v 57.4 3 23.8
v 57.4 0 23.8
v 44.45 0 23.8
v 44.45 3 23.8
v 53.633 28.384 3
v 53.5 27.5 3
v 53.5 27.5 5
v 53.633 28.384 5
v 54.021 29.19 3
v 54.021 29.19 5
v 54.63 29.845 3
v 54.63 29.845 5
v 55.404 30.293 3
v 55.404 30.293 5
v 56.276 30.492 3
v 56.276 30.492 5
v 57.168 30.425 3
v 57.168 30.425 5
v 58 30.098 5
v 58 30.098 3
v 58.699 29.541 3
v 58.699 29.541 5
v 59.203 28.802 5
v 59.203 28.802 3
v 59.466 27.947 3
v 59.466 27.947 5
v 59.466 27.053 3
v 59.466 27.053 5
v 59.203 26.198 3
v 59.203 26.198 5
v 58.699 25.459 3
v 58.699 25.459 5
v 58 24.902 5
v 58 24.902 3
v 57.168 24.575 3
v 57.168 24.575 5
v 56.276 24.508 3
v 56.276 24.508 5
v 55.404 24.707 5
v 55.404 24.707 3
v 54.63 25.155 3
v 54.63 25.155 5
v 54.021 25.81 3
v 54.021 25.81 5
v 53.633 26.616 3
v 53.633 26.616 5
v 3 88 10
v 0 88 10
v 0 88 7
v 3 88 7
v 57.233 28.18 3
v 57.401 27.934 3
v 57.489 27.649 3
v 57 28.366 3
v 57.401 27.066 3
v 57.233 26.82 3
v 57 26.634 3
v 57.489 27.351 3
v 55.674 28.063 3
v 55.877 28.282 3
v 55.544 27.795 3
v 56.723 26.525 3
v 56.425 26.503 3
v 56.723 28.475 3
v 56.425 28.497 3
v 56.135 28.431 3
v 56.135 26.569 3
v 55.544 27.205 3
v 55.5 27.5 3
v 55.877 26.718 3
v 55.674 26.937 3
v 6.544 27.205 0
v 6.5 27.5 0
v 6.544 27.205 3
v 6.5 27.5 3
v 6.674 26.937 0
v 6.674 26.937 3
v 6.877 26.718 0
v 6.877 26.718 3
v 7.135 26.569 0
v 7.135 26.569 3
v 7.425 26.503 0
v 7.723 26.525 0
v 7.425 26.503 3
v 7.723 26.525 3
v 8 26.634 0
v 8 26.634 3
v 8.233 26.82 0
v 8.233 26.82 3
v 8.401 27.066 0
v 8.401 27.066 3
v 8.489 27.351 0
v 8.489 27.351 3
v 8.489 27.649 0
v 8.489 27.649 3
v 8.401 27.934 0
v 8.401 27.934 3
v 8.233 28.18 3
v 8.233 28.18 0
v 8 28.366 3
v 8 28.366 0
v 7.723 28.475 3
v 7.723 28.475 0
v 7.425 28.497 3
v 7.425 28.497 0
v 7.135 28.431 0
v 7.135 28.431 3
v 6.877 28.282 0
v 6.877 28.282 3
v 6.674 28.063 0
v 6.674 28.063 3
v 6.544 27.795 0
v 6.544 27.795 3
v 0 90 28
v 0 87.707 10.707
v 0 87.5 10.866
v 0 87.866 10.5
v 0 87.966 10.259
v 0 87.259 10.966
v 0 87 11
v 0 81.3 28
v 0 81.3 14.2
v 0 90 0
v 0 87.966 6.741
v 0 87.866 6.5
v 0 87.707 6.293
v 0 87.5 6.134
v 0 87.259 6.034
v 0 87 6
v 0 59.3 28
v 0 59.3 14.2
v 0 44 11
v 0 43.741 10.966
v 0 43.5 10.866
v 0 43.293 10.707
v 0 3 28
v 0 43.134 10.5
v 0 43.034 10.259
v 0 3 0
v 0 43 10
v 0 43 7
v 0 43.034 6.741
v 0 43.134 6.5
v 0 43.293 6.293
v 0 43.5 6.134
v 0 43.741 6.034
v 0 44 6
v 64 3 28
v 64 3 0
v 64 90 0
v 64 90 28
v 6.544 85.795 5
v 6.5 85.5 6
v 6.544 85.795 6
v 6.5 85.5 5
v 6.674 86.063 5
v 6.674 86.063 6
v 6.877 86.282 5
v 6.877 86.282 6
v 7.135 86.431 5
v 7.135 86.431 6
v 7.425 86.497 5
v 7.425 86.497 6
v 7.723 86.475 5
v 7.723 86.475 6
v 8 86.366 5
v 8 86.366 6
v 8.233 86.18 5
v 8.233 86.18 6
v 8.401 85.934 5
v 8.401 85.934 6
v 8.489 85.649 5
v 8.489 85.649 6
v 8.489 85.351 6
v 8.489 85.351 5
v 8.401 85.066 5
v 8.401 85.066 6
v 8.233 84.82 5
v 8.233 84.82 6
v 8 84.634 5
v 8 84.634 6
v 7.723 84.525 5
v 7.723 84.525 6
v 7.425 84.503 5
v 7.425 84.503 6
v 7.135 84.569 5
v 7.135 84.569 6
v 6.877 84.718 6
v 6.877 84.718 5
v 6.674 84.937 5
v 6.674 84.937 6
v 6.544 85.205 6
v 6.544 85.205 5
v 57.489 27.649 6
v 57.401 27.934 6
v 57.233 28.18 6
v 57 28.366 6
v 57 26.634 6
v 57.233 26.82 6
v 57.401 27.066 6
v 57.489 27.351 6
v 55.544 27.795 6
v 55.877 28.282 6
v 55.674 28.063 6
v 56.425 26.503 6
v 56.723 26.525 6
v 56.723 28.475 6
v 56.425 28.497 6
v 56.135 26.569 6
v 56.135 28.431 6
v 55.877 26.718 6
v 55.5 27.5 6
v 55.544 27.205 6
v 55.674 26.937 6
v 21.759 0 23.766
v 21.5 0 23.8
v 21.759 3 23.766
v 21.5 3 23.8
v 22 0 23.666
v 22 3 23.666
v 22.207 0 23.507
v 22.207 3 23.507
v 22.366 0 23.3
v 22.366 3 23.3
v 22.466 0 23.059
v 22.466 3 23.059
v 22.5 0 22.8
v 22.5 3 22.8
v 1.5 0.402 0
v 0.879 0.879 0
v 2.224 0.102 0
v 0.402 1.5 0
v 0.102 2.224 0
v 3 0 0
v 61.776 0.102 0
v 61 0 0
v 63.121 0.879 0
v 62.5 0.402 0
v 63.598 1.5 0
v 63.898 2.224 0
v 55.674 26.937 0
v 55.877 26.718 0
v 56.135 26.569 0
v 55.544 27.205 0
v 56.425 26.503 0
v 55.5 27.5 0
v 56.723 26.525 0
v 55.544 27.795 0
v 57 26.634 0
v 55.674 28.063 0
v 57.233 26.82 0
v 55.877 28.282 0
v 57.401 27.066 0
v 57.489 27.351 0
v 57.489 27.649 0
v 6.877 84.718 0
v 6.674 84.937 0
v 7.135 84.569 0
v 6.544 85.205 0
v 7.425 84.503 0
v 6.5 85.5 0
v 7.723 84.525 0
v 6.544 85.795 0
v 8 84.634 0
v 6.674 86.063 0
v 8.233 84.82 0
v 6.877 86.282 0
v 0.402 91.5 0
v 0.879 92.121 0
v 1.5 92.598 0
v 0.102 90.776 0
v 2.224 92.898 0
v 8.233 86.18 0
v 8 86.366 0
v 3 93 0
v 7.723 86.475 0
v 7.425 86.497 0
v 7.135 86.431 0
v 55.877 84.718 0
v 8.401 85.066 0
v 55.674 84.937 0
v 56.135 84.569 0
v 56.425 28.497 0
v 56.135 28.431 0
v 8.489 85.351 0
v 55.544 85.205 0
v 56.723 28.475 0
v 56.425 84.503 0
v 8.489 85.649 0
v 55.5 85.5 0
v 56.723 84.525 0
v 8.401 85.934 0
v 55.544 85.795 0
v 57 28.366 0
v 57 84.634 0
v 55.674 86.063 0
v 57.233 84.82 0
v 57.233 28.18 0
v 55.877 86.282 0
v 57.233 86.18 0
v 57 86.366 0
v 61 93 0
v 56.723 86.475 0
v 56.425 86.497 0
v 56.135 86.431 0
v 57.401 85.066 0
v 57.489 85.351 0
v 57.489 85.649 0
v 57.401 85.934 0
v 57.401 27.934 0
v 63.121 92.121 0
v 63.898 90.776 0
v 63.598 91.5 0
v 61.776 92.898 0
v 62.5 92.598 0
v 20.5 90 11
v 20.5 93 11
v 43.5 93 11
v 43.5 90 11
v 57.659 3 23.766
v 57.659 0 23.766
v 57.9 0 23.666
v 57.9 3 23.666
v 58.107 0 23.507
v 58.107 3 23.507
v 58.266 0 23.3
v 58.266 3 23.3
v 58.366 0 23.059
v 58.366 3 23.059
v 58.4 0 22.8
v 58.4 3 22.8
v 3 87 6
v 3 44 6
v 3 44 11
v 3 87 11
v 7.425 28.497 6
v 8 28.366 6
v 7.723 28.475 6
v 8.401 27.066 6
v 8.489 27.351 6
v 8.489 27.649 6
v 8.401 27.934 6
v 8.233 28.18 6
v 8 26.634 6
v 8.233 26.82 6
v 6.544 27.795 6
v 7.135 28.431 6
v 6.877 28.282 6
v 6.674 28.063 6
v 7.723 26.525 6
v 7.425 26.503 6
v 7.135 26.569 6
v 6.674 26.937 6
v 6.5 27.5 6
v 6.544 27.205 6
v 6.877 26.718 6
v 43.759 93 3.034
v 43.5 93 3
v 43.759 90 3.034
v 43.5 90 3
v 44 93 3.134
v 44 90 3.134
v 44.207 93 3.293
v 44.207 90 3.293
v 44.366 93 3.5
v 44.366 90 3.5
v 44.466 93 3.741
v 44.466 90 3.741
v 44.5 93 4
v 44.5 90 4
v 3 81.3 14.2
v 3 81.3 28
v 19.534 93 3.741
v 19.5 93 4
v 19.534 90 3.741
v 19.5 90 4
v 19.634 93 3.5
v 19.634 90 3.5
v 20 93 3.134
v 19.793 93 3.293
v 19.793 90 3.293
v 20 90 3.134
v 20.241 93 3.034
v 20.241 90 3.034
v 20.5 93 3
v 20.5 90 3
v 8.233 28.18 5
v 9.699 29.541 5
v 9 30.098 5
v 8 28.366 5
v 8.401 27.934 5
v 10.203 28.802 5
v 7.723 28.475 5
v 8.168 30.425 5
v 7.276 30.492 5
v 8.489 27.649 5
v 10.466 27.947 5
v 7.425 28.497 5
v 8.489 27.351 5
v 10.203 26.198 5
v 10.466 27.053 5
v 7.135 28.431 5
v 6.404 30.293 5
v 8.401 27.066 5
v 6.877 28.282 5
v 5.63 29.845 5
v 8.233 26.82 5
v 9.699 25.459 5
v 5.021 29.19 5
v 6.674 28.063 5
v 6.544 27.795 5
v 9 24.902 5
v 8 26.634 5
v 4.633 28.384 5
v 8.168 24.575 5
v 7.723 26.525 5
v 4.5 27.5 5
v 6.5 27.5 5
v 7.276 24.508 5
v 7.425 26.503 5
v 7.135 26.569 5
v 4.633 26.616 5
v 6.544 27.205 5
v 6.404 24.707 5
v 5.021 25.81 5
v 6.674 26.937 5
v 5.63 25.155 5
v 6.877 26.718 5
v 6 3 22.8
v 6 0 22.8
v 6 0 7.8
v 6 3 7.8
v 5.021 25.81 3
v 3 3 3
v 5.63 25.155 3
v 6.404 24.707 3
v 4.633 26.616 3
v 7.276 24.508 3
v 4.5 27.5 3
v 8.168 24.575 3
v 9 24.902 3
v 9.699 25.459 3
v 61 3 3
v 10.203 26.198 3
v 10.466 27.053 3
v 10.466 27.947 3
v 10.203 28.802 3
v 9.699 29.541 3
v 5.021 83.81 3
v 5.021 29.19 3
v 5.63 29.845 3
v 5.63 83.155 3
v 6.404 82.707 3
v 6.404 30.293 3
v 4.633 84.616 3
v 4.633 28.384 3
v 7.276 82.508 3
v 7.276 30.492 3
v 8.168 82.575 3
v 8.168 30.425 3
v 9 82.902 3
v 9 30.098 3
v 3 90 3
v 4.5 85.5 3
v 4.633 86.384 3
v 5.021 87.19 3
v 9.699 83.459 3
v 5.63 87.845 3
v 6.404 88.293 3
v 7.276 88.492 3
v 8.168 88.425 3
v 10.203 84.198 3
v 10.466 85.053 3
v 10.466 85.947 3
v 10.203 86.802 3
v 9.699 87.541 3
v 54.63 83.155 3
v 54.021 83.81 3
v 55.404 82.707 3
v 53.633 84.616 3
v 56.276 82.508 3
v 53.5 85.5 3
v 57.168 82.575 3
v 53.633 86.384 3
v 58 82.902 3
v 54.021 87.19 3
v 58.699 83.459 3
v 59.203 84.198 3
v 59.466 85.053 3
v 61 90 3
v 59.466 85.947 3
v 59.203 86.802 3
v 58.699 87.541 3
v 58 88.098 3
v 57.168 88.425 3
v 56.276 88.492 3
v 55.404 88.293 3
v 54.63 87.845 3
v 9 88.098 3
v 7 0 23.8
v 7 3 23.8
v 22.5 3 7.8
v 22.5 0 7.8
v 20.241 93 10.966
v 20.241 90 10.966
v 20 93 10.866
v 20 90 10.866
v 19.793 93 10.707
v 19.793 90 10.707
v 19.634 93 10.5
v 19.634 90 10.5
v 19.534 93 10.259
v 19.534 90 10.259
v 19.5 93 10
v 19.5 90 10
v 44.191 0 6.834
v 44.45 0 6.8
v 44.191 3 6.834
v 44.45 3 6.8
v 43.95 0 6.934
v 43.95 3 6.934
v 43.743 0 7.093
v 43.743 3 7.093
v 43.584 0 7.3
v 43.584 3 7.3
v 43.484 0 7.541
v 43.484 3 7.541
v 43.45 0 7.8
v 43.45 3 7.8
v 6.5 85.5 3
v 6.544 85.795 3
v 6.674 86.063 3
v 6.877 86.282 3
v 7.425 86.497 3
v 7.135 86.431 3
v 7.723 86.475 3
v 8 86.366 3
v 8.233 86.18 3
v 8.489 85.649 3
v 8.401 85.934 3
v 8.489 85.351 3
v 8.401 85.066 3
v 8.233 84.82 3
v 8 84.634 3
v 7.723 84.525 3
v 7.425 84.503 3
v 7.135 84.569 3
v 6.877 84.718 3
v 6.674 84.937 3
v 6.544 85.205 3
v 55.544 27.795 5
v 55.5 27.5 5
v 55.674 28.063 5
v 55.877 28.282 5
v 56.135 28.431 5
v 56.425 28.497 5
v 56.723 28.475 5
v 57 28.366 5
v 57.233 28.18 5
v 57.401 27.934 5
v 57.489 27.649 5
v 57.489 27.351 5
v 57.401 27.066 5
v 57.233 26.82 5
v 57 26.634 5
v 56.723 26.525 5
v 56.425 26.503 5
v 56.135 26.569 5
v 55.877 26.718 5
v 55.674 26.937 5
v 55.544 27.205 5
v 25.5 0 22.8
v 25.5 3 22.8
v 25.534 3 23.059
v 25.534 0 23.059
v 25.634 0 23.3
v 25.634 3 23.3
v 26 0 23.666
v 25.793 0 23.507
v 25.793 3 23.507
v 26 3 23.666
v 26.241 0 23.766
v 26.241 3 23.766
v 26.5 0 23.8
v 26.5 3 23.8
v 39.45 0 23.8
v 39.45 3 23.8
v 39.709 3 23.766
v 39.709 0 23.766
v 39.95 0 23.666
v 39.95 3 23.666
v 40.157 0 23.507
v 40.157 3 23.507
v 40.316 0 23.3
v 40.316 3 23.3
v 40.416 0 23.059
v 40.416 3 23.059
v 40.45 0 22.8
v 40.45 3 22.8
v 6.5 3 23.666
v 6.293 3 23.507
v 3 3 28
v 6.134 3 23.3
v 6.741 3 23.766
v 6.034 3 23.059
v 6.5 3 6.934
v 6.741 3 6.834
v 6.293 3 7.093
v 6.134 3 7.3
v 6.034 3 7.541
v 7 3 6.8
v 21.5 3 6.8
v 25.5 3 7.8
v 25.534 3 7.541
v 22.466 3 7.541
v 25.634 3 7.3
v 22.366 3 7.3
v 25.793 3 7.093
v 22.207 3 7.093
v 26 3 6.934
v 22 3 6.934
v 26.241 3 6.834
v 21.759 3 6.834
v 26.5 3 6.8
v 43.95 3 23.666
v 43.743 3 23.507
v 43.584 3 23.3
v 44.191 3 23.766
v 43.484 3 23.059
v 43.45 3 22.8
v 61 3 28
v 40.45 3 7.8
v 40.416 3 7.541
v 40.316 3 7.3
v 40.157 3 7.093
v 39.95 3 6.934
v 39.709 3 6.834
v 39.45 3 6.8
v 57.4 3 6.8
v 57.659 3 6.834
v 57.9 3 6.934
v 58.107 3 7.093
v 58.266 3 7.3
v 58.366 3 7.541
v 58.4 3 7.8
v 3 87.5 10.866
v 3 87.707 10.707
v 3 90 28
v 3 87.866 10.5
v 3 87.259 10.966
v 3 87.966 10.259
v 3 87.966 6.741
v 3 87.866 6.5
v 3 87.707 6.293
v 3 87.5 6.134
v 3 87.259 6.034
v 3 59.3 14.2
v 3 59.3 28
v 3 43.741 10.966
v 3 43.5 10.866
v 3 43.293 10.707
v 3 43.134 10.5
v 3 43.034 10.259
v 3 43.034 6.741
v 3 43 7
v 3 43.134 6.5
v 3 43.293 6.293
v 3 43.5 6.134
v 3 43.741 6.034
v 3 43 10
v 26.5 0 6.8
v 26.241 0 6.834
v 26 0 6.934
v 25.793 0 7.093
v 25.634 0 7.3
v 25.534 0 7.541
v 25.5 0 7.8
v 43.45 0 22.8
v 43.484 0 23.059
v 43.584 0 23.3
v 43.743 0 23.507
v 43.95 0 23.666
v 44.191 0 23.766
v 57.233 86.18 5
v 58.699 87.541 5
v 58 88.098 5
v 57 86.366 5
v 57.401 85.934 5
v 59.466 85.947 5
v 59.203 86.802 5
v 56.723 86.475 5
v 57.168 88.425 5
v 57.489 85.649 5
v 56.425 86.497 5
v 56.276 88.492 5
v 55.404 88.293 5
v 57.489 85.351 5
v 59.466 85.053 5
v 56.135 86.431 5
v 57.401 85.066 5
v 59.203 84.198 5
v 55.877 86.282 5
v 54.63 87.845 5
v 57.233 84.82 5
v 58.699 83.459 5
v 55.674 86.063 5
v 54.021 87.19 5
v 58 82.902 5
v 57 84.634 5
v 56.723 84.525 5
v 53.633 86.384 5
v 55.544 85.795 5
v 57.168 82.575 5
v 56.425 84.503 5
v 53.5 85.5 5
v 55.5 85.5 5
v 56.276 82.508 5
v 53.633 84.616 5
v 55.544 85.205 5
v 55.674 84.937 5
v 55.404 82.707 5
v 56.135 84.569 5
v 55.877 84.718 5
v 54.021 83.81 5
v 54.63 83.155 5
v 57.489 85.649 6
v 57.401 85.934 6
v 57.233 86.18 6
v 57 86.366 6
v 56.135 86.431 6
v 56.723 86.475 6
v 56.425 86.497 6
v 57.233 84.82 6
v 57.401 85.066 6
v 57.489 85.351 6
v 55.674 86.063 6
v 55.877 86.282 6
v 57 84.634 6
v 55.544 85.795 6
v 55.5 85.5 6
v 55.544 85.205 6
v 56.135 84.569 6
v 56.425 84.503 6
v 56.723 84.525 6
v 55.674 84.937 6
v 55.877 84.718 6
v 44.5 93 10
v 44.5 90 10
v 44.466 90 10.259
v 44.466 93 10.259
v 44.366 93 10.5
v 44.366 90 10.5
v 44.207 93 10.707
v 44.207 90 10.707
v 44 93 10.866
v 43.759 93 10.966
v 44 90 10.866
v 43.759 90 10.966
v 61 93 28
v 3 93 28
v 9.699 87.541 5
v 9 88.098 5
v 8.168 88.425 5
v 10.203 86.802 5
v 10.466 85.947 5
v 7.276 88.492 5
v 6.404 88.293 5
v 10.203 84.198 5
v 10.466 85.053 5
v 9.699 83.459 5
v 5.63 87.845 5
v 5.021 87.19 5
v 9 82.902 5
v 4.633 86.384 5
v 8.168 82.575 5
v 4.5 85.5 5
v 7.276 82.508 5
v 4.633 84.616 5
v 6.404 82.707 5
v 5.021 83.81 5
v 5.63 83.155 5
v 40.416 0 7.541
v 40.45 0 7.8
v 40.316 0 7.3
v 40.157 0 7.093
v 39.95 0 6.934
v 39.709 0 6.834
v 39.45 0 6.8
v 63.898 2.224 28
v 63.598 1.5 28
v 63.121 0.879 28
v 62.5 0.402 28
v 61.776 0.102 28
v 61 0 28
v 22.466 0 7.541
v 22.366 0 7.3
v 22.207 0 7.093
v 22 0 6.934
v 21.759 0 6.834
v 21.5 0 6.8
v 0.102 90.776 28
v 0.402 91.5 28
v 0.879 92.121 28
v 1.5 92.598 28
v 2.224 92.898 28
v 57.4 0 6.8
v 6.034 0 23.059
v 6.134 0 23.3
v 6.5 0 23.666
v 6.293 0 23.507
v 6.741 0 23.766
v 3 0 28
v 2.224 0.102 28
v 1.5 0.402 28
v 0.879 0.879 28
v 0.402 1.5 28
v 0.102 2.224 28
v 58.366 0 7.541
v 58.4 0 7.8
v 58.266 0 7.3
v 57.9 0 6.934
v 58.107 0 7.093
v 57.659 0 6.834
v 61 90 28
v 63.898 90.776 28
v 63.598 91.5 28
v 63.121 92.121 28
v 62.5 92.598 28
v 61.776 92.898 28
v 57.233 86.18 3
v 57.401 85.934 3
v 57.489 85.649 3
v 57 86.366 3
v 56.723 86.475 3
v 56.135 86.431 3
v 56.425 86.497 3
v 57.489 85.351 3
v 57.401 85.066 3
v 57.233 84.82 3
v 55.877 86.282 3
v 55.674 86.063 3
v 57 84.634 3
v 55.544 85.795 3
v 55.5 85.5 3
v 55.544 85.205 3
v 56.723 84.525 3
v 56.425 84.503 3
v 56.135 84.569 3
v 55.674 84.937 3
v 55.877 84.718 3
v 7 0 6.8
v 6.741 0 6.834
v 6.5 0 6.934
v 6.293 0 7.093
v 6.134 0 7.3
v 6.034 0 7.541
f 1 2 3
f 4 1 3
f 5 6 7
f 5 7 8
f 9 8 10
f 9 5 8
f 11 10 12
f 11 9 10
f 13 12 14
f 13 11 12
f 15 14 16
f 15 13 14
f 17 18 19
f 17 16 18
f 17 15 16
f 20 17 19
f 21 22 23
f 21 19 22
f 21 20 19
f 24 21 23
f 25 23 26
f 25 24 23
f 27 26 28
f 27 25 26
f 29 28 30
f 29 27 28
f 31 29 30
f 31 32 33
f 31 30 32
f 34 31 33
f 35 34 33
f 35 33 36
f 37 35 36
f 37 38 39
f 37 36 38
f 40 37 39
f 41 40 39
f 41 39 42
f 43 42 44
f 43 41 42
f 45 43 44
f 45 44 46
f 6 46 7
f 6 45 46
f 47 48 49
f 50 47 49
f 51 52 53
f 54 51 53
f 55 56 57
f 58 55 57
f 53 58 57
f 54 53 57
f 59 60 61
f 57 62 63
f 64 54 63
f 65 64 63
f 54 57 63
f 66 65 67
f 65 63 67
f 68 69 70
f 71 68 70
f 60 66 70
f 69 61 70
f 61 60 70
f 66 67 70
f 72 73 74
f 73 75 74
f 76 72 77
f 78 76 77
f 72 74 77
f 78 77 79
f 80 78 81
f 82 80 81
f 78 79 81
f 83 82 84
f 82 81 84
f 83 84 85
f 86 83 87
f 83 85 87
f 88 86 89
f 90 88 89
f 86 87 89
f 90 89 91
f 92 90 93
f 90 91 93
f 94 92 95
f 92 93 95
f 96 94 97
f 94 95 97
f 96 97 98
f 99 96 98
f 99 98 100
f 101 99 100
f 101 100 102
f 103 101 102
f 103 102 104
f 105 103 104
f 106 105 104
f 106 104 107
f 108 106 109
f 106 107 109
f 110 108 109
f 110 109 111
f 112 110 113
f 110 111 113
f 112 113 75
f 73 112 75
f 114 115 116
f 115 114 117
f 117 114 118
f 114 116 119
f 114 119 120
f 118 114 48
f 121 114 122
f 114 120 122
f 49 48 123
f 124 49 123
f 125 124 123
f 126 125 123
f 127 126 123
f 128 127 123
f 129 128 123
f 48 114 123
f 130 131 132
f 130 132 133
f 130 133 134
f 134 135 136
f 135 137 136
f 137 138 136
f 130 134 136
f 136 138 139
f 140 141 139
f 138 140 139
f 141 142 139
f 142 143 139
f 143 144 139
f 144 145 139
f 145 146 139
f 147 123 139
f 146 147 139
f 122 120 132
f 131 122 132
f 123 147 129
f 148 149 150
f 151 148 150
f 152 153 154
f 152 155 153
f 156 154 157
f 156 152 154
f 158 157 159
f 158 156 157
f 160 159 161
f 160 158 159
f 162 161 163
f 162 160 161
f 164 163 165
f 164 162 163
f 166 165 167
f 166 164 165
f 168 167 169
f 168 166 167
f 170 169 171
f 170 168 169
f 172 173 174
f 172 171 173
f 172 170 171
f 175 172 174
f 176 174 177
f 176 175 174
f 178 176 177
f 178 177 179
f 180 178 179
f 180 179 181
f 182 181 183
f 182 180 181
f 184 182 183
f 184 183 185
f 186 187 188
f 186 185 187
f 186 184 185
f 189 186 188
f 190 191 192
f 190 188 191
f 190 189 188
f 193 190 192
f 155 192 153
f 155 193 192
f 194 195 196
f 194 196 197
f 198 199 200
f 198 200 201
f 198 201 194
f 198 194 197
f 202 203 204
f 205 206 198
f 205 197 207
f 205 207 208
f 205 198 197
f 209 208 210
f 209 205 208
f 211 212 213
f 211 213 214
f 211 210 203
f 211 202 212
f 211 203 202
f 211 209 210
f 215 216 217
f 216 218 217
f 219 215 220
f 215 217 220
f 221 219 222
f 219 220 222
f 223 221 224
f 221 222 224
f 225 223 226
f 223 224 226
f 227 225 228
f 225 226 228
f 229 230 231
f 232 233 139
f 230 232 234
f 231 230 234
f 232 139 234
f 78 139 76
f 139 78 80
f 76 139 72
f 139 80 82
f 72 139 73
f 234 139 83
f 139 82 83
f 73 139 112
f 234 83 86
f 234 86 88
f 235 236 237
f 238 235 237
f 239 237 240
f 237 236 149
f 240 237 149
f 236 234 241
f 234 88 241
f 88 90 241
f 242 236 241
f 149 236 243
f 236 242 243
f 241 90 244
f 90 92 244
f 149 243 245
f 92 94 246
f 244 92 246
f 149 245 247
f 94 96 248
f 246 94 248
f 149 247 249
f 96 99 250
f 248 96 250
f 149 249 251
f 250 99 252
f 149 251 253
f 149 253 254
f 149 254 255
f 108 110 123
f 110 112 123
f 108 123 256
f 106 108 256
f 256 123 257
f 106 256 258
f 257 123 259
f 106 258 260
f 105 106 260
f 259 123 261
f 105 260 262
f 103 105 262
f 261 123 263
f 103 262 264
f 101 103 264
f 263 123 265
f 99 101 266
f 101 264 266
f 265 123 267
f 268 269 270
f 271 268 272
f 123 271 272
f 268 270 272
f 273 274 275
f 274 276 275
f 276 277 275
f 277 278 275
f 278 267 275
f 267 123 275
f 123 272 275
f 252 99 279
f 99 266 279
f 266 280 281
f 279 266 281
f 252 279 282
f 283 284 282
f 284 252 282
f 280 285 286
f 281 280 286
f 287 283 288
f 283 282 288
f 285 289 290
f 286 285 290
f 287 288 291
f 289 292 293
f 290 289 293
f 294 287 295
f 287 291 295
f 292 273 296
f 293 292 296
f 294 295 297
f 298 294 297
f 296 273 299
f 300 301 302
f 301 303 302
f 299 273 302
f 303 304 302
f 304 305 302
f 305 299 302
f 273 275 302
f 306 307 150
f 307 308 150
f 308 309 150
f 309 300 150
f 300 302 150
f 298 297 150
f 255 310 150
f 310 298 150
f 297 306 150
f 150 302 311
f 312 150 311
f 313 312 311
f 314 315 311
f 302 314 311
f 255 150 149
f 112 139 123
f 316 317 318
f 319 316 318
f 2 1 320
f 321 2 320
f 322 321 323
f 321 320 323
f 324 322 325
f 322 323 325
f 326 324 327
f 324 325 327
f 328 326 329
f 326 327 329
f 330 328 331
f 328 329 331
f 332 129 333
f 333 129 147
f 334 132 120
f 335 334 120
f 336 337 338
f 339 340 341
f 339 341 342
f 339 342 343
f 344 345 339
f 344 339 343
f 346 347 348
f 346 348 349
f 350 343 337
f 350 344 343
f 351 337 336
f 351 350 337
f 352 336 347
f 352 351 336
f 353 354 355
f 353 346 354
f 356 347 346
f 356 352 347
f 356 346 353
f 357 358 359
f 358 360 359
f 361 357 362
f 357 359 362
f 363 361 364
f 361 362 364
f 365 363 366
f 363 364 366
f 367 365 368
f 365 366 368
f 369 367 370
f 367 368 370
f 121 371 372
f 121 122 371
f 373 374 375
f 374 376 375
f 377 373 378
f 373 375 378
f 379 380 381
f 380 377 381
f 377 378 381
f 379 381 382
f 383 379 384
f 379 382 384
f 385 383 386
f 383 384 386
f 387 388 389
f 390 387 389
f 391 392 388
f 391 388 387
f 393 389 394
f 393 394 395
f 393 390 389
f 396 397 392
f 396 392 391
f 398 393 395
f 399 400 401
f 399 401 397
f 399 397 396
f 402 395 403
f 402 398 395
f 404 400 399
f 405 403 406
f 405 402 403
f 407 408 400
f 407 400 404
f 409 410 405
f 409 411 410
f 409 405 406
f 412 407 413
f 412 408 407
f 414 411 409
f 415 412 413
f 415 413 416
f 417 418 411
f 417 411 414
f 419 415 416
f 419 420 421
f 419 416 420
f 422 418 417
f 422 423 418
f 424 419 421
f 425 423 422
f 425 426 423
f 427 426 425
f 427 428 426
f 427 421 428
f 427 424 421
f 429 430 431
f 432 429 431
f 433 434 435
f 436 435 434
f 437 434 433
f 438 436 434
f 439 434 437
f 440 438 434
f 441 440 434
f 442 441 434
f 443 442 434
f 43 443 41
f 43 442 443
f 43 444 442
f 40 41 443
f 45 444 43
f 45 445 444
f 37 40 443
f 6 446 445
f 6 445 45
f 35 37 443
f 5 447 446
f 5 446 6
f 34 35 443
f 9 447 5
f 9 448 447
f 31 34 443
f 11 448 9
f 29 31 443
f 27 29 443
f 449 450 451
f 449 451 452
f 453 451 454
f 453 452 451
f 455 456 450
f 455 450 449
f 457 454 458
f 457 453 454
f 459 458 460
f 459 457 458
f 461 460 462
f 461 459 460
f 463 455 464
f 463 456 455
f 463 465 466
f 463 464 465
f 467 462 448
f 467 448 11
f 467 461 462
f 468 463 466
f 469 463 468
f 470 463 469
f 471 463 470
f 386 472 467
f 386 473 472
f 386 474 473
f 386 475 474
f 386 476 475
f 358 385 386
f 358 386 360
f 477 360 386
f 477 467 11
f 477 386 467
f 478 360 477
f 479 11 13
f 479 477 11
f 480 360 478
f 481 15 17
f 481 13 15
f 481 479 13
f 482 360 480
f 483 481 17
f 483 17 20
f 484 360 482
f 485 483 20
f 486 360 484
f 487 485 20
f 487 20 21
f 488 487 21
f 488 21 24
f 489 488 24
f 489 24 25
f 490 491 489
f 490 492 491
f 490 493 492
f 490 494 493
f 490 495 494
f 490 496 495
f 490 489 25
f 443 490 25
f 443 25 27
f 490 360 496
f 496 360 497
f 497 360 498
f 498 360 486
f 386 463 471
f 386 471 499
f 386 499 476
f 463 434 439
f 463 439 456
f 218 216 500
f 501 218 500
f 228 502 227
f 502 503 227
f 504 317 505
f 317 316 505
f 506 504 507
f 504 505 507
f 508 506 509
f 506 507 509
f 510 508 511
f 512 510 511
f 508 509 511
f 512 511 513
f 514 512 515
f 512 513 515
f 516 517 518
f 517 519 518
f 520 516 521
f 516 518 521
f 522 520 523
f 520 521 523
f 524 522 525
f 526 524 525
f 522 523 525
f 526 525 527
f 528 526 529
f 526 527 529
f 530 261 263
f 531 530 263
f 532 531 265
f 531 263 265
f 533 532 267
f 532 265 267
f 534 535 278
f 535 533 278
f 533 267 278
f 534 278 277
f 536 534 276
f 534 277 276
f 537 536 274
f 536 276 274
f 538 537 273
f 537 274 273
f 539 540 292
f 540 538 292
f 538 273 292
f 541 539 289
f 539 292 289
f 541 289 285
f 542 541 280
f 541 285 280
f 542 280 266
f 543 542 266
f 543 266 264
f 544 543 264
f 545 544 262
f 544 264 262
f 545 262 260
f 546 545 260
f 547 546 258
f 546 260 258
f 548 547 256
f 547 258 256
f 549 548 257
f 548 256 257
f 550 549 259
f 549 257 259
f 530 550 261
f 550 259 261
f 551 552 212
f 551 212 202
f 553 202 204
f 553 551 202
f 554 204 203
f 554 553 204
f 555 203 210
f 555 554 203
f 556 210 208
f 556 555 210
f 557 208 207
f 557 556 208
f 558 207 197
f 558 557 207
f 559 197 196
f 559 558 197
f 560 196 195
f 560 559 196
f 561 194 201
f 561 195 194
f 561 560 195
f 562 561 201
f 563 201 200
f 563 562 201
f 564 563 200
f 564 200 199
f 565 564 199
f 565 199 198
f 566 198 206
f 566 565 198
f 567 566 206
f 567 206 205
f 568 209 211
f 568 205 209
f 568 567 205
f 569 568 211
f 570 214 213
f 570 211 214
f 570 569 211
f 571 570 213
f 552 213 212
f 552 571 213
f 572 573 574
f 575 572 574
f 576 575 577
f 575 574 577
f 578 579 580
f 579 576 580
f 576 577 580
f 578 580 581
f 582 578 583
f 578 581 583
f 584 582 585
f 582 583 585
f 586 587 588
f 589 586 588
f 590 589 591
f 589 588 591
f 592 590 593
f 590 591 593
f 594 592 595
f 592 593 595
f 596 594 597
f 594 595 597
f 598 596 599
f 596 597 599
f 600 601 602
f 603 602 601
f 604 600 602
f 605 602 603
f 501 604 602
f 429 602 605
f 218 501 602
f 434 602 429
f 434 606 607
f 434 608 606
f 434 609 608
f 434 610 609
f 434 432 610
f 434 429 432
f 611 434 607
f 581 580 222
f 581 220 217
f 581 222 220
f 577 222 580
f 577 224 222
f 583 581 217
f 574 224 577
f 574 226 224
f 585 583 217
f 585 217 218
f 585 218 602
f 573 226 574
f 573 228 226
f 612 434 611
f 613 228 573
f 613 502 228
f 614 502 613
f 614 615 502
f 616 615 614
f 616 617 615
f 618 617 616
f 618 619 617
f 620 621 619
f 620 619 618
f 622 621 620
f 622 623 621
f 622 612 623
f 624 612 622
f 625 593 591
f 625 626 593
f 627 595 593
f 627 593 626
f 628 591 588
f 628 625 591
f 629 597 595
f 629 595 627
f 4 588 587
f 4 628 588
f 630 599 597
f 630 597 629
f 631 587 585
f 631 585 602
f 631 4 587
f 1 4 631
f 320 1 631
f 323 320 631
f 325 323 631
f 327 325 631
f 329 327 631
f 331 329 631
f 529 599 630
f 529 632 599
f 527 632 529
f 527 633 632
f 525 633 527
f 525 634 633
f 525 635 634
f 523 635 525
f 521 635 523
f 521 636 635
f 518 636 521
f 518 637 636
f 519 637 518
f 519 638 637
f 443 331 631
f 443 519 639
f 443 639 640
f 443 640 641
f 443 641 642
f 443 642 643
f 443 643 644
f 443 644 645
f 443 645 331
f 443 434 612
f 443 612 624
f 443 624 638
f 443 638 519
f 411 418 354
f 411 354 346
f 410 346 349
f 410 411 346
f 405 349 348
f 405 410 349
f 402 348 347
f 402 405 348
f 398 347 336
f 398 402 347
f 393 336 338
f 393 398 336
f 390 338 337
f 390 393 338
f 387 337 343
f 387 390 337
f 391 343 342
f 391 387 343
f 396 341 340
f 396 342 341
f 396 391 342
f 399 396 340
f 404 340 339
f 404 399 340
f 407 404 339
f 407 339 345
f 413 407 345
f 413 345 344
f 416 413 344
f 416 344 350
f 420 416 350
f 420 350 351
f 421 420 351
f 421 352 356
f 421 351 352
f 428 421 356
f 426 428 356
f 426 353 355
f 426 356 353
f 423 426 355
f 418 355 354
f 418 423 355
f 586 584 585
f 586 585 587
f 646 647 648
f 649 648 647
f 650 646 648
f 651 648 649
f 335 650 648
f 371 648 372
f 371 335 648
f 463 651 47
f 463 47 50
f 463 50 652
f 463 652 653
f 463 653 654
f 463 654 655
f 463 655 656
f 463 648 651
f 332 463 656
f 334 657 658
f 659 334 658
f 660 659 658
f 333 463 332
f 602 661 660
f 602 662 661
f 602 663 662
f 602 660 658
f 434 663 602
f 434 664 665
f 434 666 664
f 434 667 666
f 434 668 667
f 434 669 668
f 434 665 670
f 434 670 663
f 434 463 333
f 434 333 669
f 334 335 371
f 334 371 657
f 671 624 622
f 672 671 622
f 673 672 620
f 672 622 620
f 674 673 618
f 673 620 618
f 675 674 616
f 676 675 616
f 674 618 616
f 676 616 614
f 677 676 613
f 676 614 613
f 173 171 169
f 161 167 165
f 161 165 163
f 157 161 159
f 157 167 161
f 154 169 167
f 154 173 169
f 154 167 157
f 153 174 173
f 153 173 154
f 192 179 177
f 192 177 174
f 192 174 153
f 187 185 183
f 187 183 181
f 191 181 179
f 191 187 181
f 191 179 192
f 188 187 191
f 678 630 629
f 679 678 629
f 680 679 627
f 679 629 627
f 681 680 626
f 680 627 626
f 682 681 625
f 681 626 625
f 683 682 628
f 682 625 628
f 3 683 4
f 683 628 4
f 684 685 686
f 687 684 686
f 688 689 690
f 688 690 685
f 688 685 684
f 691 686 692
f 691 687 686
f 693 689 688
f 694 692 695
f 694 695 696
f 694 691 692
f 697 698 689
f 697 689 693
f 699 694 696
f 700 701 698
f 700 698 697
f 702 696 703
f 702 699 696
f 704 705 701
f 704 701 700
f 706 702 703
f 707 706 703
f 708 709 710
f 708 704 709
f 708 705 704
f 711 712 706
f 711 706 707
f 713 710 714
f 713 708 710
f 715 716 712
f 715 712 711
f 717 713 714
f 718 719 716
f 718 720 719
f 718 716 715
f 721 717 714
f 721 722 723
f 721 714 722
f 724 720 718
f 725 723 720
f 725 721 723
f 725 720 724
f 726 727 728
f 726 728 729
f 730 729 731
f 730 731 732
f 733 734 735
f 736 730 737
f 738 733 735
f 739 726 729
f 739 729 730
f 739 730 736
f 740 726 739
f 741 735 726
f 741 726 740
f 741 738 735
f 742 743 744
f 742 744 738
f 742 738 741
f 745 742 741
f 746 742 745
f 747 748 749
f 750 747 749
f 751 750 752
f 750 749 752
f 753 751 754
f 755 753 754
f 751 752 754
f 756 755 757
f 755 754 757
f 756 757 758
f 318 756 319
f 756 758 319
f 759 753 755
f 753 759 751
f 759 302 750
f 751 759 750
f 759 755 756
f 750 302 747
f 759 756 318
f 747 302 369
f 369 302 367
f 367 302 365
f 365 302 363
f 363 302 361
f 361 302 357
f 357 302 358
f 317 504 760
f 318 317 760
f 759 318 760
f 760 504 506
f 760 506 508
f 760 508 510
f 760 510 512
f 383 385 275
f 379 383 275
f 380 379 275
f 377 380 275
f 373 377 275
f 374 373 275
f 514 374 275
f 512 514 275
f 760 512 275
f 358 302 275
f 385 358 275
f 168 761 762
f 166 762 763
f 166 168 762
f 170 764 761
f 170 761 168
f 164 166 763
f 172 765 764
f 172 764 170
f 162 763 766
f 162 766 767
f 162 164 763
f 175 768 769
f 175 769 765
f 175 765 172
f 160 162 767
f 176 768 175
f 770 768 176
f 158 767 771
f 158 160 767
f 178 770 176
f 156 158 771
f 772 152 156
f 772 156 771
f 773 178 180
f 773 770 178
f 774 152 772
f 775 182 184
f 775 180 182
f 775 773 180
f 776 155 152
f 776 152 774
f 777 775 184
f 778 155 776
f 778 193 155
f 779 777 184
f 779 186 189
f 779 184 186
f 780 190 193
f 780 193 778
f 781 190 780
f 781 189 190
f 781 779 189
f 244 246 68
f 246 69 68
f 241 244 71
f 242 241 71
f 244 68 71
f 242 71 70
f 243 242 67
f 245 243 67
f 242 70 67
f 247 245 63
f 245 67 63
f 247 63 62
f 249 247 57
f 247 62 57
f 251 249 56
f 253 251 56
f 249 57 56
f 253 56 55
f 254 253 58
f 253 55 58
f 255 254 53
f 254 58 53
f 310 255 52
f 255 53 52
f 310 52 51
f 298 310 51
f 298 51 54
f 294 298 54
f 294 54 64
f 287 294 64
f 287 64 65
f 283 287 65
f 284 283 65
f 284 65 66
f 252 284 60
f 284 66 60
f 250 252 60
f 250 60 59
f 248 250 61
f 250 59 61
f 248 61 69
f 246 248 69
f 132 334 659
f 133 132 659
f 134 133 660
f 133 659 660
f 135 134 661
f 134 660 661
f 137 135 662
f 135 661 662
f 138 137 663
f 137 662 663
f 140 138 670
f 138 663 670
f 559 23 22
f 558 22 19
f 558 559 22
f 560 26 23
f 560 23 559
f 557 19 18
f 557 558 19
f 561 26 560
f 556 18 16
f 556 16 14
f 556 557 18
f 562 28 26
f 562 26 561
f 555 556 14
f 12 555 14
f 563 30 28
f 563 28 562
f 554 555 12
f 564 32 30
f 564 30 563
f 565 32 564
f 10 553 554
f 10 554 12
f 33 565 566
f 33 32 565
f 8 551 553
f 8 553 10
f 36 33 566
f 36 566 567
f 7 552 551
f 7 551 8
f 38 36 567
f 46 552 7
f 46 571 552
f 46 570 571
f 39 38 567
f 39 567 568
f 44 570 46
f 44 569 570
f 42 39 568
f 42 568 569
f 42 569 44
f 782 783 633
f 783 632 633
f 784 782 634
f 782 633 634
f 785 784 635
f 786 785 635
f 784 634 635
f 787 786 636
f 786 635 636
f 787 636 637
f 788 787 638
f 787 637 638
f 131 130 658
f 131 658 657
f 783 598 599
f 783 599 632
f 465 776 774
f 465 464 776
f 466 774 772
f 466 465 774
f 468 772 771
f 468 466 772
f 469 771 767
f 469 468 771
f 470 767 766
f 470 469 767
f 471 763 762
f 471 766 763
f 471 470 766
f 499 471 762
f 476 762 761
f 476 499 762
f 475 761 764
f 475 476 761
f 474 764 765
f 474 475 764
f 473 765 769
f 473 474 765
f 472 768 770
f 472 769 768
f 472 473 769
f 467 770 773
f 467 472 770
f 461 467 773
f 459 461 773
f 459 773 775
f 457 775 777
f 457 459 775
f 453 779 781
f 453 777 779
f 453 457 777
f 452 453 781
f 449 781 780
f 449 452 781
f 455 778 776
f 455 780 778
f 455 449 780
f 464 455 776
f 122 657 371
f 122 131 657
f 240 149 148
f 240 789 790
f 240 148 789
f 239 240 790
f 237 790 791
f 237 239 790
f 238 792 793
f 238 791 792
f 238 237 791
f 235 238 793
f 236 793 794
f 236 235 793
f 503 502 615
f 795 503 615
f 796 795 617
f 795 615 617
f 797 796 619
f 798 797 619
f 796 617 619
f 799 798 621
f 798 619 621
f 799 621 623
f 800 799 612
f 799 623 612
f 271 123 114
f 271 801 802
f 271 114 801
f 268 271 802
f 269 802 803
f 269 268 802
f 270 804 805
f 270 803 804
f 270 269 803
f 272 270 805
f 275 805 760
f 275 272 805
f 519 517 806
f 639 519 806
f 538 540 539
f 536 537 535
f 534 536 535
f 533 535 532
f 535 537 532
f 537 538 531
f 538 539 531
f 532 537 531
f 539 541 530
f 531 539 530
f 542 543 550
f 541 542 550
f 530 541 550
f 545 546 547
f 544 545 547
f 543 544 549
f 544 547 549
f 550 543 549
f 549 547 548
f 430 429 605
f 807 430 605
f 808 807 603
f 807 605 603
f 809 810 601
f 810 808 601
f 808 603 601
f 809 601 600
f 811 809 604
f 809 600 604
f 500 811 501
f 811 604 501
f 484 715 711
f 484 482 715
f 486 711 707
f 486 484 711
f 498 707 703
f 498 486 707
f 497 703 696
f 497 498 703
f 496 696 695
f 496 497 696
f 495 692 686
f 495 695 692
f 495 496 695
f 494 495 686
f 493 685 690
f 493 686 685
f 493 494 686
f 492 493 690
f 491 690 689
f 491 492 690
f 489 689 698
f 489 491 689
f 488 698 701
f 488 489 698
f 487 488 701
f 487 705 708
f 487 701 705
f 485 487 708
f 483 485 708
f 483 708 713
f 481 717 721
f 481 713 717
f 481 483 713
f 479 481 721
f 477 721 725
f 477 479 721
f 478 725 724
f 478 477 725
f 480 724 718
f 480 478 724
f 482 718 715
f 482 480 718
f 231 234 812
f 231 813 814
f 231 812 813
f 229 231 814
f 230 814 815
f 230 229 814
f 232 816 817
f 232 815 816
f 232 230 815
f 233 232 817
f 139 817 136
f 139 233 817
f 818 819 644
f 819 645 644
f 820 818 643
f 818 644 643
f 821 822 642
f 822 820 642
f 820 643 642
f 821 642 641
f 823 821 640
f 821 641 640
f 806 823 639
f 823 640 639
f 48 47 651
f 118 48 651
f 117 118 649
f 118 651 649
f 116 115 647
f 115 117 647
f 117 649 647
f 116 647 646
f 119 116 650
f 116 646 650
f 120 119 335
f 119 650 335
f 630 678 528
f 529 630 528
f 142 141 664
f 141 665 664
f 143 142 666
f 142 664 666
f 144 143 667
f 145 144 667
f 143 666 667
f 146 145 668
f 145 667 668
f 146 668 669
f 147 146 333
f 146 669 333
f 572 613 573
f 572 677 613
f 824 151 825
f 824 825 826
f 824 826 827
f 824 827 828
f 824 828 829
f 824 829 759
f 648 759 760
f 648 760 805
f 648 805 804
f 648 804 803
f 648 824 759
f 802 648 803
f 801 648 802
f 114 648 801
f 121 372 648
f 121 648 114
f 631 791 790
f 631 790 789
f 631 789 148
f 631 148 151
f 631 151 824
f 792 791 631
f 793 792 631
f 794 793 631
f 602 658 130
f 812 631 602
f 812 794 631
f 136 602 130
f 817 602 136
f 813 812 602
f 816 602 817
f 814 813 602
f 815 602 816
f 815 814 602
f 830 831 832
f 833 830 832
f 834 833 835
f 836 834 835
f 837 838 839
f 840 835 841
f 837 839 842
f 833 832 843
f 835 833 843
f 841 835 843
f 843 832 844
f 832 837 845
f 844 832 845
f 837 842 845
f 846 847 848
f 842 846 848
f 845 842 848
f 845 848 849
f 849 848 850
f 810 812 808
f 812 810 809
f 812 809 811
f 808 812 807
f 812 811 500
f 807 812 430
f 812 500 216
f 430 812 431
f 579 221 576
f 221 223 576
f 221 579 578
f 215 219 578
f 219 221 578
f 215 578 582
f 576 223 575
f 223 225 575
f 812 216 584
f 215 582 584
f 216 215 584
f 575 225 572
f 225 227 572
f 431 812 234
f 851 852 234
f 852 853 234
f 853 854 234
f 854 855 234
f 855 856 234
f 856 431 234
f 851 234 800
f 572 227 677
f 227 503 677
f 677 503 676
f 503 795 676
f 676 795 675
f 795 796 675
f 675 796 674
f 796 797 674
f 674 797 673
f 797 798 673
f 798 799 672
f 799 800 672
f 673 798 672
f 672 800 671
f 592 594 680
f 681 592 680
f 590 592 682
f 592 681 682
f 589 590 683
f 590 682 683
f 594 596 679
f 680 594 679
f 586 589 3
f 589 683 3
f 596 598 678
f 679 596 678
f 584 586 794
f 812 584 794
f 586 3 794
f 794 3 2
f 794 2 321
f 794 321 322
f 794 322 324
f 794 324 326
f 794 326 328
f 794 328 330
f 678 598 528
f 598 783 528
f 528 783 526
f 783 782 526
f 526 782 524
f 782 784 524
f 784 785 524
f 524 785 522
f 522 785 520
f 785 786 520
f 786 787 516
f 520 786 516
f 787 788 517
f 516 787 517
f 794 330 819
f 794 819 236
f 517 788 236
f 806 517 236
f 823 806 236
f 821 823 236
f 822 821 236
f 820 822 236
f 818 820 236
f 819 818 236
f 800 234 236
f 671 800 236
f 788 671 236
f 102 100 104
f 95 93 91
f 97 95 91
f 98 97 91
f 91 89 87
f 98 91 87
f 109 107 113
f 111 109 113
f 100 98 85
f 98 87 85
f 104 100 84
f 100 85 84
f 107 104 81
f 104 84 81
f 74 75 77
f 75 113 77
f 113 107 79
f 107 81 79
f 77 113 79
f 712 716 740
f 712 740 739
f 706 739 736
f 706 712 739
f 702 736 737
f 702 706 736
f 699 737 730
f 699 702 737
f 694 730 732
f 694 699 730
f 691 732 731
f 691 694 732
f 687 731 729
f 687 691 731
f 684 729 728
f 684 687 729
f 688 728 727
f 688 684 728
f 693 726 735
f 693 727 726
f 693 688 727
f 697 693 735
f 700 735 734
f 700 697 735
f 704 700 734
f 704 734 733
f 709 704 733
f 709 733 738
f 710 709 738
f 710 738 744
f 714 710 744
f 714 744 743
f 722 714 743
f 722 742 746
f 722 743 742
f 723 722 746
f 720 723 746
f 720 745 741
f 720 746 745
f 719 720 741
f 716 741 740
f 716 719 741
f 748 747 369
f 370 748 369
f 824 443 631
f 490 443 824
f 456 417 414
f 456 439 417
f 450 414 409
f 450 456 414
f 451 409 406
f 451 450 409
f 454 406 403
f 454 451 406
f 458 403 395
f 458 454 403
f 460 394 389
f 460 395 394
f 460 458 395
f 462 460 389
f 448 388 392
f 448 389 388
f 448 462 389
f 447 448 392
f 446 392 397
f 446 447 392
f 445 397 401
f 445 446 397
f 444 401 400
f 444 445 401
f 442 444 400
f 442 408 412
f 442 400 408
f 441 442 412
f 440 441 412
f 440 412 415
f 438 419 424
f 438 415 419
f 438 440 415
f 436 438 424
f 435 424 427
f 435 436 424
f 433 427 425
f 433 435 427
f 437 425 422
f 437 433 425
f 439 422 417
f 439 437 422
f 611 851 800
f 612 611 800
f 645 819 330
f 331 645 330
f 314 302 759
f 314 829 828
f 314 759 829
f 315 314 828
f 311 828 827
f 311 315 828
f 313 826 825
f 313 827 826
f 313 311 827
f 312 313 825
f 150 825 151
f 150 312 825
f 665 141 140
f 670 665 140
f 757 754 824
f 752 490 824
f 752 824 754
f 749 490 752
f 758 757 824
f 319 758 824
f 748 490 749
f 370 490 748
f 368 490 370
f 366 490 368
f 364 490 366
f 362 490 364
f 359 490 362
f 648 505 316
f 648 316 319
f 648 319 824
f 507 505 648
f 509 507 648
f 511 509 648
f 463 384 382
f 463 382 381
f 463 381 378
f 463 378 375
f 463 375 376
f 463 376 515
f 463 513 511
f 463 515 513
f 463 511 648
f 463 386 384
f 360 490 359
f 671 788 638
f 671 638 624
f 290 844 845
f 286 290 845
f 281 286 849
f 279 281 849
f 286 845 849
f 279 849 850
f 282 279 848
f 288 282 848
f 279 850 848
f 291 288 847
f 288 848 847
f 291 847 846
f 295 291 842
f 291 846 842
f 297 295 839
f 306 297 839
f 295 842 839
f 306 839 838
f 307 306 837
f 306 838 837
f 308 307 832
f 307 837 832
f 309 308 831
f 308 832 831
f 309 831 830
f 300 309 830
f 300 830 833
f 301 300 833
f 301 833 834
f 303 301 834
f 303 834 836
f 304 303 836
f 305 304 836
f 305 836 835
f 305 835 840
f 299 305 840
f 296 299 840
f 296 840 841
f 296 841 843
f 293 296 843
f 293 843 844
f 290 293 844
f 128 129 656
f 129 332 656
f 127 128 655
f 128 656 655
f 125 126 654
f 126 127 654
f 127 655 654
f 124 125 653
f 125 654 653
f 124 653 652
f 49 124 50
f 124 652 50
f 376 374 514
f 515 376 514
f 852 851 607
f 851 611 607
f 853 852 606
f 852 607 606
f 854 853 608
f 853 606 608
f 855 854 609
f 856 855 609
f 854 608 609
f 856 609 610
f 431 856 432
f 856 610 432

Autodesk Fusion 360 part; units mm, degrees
sketch "Sketch1" plane through (0, 0, 0) normal (0, 0, 1) x (1, 0, 0)
  line L0 (3, 0) -> (61, 0)
  line L1 (64, 3) -> (64, 90)
  line L2 (61, 93) -> (3, 93)
  line L3 (0, 90) -> (0, 3)
  arc A0 (3, 93) -> (0, 90) centre (3, 90) ccw
  arc A1 (64, 90) -> (61, 93) centre (61, 90) ccw
  arc A2 (61, 0) -> (64, 3) centre (61, 3) ccw
  arc A3 (0, 3) -> (3, 0) centre (3, 3) ccw
  point P0 (64, 0)
  point P1 (0, 93)
  dimension "d1" = 64
  dimension "d2" = 93
  dimension "d3" = 3
  dimension "d4" = 3
extrude "Extrude1" add sketch "Sketch1" along normal blind 3
sketch "Sketch4" plane through (0, 0, 3) normal (0, 0, 1) x (-1, 0, 0)
  arc A0 (0, -3) -> (-3, 0) centre (-3, -3) ccw
  line L0 (-3, 0) -> (-61, 0)
  arc A1 (-61, 0) -> (-64, -3) centre (-61, -3) ccw
  line L1 (-64, -3) -> (-64, -90)
  arc A2 (-64, -90) -> (-61, -93) centre (-61, -90) ccw
  line L2 (-61, -93) -> (-3, -93)
  arc A3 (-3, -93) -> (0, -90) centre (-3, -90) ccw
  line L3 (0, -90) -> (0, -3)
  line L4 (-3, -3) -> (-61, -3)
  line L5 (-61, -3) -> (-61, -90)
  line L6 (-61, -90) -> (-3, -90)
  line L7 (-3, -90) -> (-3, -3)
  dimension "d11" = 58
  dimension "d12" = 87
  dimension "d13" = 3
  dimension "d14" = 3
extrude "Extrude2" add sketch "Sketch4" along normal blind 25
sketch "Sketch5" plane through (0, 0, 0) normal (0, -1, 0) x (1, 0, 0)
  line L0 (3, 0) -> (61, 0)
  line L1 (61, 0) -> (61, 23)
  line L2 (3, 23) -> (61, 23)
  line L3 (6, 6.8) -> (22.5, 6.8)
  line L4 (22.5, 6.8) -> (22.5, 23.8)
  line L5 (22.5, 23.8) -> (6, 23.8)
  line L6 (6, 23.8) -> (6, 6.8)
  line L7 (3, 0) -> (3, 23)
  line L8 (25.5, 23.8) -> (40.45, 23.8)
  line L9 (40.45, 23.8) -> (40.45, 6.8)
  line L10 (40.45, 6.8) -> (25.5, 6.8)
  line L11 (25.5, 6.8) -> (25.5, 23.8)
  line L12 (43.45, 6.8) -> (58.4, 6.8)
  line L13 (58.4, 6.8) -> (58.4, 23.8)
  line L14 (58.4, 23.8) -> (43.45, 23.8)
  line L15 (43.45, 23.8) -> (43.45, 6.8)
  line L16 (3, 0) -> (61, 0)
  line L17 (61, 0) -> (61, 28)
  line L18 (61, 28) -> (3, 28)
  line L19 (3, 28) -> (3, 0)
  dimension "d21" = 16.5
  dimension "d22" = 17
  dimension "d23" = 3
  dimension "d26" = 14.95
  dimension "d27" = 17
  dimension "d29" = 14.95
  dimension "d30" = 17
  dimension "d31" = 3
  dimension "d34" = 3
  dimension "d45" = 6.8
extrude "Extrude4" cut sketch "Sketch5" against normal blind 3 contours L2 L4 L5 L6 | L2 L3 L4 L6 | L2 L12 L13 L15 | L2 L13 L14 L15 | L2 L8 L9 L11 | L2 L9 L10 L11
sketch "Sketch6" plane through (0, 0, 3) normal (0, 0, 1) x (-1, 0, 0)
  line L0 (-3, -3) -> (-61, -3)
  line L1 (-61, -3) -> (-61, -90)
  line L2 (-61, -90) -> (-3, -90)
  line L3 (-3, -90) -> (-3, -3)
  circle A0 centre (-7.5, -85.5) radius 1
  circle A1 centre (-7.5, -85.5) radius 3
  circle A2 centre (-56.5, -85.5) radius 1
  circle A3 centre (-56.5, -85.5) radius 3
  circle A4 centre (-56.5, -27.5) radius 1
  circle A5 centre (-56.5, -27.5) radius 3
  circle A6 centre (-7.5, -27.5) radius 1
  circle A7 centre (-7.5, -27.5) radius 3
  dimension "d35" = 2
  dimension "d36" = 4.5
  dimension "d37" = 4.5
  dimension "d38" = 6
  dimension "d59" = 2
  dimension "d60" = 4.5
  dimension "d61" = 4.5
  dimension "d62" = 6
  dimension "d63" = 2
  dimension "d64" = 4.5
  dimension "d65" = 58
  dimension "d66" = 6
  dimension "d67" = 2
  dimension "d68" = 4.5
  dimension "d69" = 58
  dimension "d70" = 6
extrude "Extrude6" cut sketch "Sketch6" against normal blind 3 contours A0 | A2 | A4 | A6
extrude "Extrude7" add sketch "Sketch6" along normal blind 0.5 contours A1
sketch "Sketch7" plane through (0, 0, 0) normal (-1, 0, 0) x (0, -1, 0)
  line L0 (-90, 0) -> (-3, 0)
  line L1 (-3, 0) -> (-3, 28)
  line L2 (-3, 28) -> (-90, 28)
  line L3 (-90, 28) -> (-90, 0)
  line L4 (-88, 6) -> (-43, 6)
  line L5 (-43, 6) -> (-43, 11)
  line L6 (-43, 11) -> (-88, 11)
  line L7 (-88, 11) -> (-88, 6)
  dimension "d46" = 45
  dimension "d47" = 5
  dimension "d50" = 6
extrude "Extrude8" cut sketch "Sketch7" against normal blind 3 contours L4 L5 L6 L7
sketch "Sketch8" plane through (0, 93, 0) normal (0, 1, 0) x (-1, 0, 0)
  line L0 (-61, 0) -> (-3, 0)
  line L1 (-3, 0) -> (-3, 28)
  line L2 (-3, 28) -> (-61, 28)
  line L3 (-61, 28) -> (-61, 0)
  line L4 (-44.5, 3) -> (-19.5, 3)
  line L5 (-19.5, 3) -> (-19.5, 11)
  line L6 (-19.5, 11) -> (-44.5, 11)
  line L7 (-44.5, 11) -> (-44.5, 3)
  line L8 (-3, 0) -> (-3, 23)
  line L9 (-3, 0) -> (-61, 0)
  dimension "d51" = 25
  dimension "d52" = 8
  dimension "d53" = 16.5
  dimension "d54" = 3
extrude "Extrude9" cut sketch "Sketch8" against normal blind 3 contours L4 L5 L6 L7
extrude "Extrude10" add 1 faces at (9.6751, 86.3269, 3.5) along direction (0, 0, 1) blind 1.5
extrude "Extrude11" add sketch "Sketch6" along normal blind 2 contours A3 | A5 | A7
extrude "Extrude13" add sketch "Sketch6" along normal blind 3 contours A4
extrude "Extrude14" add sketch "Sketch6" along normal blind 3 contours A0 | A2 | A6
sketch "Sketch11" plane through (0, 0, 0) normal (-1, 0, 0) x (0, -1, 0)
  line L0 (-43, 6) -> (-88, 6)
  line L1 (-88, 6) -> (-88, 11)
  line L2 (-88, 11) -> (-43, 11)
  line L3 (-43, 11) -> (-43, 6)
  line L4 (-90, 0) -> (-3, 0)
  line L5 (-3, 0) -> (-3, 28)
  line L6 (-3, 28) -> (-90, 28)
  line L7 (-90, 28) -> (-90, 0)
  line L8 (-81.3, 28) -> (-59.3, 28)
  line L9 (-59.3, 28) -> (-59.3, 14.2)
  line L10 (-59.3, 14.2) -> (-81.3, 14.2)
  line L11 (-81.3, 14.2) -> (-81.3, 28)
  dimension "d85" = 22
  dimension "d86" = 13.8
  dimension "d87" = 8.7
extrude "Extrude15" cut sketch "Sketch11" against normal blind 3 contours L6 L8 L9 L10 L11
fillet "Fillet1" radius 1 1 edges at (1.5, 81.3, 14.2)
fillet "Fillet2" radius 1 21 edges at (1.5, 59.3, 14.2) (44.5, 91.5, 3) (44.5, 91.5, 11) (19.5, 91.5, 3) (19.5, 91.5, 11) (1.5, 43, 6) (6, 1.5, 6.8) (25.5, 1.5, 6.8) (43.45, 1.5, 6.8) (6, 1.5, 23.8) (25.5, 1.5, 23.8) (43.45, 1.5, 23.8) (40.45, 1.5, 23.8) (22.5, 1.5, 23.8) (58.4, 1.5, 23.8) (1.5, 88, 11) (1.5, 88, 6) (22.5, 1.5, 6.8) (40.45, 1.5, 6.8) (58.4, 1.5, 6.8) (1.5, 43, 11)
delete_face "DeleteFace1" 1 faces at (1, 80.5358, 14.2282)
delete_face "DeleteFace2" 1 faces at (1, 59.4854, 14.6199)
